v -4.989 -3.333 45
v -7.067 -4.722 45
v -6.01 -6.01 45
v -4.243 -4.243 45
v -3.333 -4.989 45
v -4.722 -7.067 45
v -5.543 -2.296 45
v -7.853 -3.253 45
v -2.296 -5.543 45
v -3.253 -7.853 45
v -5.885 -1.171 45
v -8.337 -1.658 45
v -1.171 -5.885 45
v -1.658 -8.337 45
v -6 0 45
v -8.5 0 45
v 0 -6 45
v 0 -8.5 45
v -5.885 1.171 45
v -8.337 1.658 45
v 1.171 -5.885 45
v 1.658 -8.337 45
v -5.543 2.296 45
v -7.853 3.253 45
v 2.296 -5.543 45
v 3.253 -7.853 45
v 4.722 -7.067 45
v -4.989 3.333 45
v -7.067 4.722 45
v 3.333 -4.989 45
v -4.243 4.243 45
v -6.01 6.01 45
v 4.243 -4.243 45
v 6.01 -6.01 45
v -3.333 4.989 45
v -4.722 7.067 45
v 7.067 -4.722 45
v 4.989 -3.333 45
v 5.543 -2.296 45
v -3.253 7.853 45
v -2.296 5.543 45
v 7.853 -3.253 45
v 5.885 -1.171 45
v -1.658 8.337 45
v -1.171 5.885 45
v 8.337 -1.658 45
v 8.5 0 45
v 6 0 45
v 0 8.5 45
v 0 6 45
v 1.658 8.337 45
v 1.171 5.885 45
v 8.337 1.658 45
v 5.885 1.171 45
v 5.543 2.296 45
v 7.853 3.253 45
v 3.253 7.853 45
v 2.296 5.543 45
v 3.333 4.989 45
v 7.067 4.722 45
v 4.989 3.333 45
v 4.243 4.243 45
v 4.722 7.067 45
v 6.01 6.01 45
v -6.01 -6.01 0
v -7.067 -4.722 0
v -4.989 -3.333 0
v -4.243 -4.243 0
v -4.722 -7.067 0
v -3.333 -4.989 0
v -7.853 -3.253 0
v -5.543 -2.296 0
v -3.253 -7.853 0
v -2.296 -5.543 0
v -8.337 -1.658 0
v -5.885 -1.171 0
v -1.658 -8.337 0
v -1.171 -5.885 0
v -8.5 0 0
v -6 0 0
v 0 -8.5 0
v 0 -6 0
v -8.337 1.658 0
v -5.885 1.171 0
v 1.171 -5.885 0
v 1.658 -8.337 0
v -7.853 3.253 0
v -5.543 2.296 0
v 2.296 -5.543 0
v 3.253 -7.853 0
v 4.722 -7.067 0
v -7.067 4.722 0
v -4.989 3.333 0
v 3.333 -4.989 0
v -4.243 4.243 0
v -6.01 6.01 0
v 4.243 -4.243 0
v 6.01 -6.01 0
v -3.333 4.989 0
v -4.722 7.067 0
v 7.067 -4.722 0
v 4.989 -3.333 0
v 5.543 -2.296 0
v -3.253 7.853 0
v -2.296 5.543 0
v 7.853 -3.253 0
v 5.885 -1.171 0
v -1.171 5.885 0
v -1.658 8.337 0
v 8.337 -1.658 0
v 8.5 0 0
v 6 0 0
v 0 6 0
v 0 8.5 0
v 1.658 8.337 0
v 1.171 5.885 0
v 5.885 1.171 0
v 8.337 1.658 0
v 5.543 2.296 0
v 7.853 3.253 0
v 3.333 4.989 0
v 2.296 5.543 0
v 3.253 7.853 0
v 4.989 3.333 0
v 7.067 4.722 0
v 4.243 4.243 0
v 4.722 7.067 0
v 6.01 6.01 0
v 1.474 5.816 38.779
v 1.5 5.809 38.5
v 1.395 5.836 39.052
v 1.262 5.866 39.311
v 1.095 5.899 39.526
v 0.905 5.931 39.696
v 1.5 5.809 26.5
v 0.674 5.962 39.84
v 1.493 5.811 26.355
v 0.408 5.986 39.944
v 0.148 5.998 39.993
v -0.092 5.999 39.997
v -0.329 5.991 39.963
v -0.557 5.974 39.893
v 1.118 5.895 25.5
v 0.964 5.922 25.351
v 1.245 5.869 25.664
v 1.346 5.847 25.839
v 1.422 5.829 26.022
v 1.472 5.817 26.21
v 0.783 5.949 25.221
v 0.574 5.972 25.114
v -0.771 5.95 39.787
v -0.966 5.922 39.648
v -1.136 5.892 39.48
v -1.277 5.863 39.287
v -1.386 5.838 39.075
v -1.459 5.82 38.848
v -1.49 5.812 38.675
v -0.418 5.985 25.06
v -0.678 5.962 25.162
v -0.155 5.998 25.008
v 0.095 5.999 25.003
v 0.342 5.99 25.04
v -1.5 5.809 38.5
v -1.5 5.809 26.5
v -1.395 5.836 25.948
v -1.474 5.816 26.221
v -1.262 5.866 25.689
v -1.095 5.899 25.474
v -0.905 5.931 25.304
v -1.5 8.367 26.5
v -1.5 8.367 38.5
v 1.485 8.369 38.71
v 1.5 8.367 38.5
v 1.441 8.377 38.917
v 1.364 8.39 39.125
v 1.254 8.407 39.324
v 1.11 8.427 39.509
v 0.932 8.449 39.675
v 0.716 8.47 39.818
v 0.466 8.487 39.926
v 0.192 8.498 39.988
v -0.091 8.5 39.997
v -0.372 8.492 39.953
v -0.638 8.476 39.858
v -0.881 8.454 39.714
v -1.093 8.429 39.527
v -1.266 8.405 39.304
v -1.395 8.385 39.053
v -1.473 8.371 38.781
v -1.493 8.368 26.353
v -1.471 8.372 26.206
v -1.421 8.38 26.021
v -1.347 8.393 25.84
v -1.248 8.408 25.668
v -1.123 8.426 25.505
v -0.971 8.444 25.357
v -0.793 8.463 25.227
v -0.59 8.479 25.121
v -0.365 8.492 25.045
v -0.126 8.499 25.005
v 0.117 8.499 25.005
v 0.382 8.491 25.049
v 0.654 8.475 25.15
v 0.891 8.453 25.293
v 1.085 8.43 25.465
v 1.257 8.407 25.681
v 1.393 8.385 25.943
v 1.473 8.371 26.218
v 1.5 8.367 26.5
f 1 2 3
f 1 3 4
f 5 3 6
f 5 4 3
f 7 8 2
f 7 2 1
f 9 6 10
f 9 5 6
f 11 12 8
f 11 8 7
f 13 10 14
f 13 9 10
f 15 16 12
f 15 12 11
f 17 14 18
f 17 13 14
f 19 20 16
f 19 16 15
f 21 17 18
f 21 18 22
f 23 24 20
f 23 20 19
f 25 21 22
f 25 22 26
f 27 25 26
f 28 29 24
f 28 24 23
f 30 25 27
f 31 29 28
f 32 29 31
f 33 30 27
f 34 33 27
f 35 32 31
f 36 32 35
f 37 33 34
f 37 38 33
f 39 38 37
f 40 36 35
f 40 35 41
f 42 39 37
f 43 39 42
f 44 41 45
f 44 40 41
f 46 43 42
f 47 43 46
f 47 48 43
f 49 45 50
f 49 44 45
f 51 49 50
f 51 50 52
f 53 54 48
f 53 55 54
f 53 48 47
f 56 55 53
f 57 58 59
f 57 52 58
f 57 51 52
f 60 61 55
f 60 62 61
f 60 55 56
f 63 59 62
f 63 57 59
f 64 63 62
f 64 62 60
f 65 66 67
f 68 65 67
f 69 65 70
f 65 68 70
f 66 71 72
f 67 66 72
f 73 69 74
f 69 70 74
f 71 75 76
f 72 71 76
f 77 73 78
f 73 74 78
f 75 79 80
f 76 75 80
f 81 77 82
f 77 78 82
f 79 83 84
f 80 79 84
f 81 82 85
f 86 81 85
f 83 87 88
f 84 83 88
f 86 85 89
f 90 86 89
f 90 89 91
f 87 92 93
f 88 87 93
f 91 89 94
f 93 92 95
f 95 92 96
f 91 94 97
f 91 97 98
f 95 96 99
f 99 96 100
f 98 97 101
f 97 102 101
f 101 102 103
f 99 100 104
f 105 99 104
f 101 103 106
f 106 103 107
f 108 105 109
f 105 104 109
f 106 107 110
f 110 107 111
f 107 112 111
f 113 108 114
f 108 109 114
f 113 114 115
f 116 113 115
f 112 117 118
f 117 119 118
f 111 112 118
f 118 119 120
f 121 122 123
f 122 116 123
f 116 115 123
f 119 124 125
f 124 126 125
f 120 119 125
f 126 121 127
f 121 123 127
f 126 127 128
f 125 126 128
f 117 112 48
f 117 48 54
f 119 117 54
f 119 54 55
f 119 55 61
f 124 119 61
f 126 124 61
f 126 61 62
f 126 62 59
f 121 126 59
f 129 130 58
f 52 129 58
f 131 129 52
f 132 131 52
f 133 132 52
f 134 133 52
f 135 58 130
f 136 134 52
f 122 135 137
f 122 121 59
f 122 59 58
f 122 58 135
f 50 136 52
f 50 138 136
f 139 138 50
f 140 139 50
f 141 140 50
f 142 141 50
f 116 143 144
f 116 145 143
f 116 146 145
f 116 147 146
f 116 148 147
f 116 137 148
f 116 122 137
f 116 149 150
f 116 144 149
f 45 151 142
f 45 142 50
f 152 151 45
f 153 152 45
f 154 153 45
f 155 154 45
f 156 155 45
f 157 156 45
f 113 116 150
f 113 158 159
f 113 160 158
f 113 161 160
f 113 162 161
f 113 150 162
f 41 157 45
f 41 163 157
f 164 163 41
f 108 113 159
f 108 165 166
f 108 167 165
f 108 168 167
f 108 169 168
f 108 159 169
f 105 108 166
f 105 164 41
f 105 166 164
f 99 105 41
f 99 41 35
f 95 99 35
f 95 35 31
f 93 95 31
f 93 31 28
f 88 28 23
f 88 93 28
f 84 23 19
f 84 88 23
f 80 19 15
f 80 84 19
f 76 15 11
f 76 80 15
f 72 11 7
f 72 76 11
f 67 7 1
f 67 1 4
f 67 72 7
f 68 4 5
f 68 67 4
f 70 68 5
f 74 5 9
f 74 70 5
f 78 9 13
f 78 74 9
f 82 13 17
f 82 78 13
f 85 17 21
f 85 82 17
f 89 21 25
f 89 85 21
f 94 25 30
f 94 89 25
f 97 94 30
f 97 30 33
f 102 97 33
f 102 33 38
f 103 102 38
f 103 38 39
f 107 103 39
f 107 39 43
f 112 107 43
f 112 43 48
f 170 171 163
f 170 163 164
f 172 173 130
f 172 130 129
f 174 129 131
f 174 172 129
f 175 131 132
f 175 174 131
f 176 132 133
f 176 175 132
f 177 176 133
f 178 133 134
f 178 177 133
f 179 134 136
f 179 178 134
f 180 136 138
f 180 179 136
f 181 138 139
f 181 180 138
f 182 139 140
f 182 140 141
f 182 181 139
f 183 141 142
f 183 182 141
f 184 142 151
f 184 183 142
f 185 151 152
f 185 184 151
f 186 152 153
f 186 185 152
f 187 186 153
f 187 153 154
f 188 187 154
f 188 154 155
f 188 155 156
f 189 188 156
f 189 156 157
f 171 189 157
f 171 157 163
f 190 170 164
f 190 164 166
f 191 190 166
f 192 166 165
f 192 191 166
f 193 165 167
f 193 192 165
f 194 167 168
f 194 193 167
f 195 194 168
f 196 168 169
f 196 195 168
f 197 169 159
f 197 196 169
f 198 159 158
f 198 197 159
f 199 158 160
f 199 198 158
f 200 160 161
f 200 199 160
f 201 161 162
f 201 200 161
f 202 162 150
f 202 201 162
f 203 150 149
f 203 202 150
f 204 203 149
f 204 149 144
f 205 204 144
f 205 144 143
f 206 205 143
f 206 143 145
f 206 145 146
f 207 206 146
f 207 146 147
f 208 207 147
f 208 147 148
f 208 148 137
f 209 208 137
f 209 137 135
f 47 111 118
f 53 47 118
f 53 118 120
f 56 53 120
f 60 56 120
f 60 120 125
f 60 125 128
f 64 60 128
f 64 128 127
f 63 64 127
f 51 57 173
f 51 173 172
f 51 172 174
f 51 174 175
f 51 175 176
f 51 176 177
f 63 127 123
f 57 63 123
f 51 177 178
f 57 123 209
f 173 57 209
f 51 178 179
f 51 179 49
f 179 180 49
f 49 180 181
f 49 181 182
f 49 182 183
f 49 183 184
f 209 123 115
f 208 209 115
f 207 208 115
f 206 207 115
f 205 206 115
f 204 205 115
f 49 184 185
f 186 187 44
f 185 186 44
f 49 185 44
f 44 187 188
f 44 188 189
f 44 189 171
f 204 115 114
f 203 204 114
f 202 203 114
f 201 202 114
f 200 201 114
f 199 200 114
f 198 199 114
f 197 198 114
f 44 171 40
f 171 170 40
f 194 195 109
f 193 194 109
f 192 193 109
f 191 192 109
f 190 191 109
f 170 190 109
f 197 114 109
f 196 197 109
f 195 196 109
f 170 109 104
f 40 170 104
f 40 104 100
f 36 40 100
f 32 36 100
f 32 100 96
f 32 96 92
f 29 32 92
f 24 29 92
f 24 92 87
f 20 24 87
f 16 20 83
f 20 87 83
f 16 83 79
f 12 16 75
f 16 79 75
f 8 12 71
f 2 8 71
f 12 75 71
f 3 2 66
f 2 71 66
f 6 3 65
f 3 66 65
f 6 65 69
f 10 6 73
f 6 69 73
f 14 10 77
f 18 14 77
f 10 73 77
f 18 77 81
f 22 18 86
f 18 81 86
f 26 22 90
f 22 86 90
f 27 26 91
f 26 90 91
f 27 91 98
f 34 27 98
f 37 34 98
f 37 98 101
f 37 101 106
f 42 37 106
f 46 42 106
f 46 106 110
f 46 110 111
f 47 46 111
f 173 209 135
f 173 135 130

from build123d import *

# Parameters (mm, degrees)
SKETCH1_R           = 8.5
SKETCH1_R_2         = 6
BOSS_EXTRUDE1_DEPTH = 45
CUT_EXTRUDE1_REACH  = 19


with BuildPart() as part:
    # Sketch1 → Boss-Extrude1 (new body)
    with BuildSketch(Plane.XY):
        Circle(SKETCH1_R)
        Circle(SKETCH1_R_2, mode=Mode.SUBTRACT)
    extrude(amount=BOSS_EXTRUDE1_DEPTH)

    # Sketch2 → Cut-Extrude1 (cut, up to next)
    with BuildSketch(Plane(origin=(0, 8.5, 0), x_dir=(-1, 0, 0), z_dir=(0, 1, 0)), mode=Mode.PRIVATE) as cut_extrude1_sk1:
        with BuildLine():
            Line((1.5, 38.5), (1.5, 26.5))
            ThreePointArc((1.5, 26.5), (0, 25), (-1.5, 26.5))
            Line((-1.5, 26.5), (-1.5, 38.5))
            ThreePointArc((-1.5, 38.5), (0, 40), (1.5, 38.5))
        make_face()
    cut_extrude1_tool1 = extrude(cut_extrude1_sk1.sketch, amount=-CUT_EXTRUDE1_REACH, mode=Mode.PRIVATE) & part.part
    add(cut_extrude1_tool1.solids().sort_by_distance((0, 8.5, 32.5))[0], mode=Mode.SUBTRACT)


solid = part.part
